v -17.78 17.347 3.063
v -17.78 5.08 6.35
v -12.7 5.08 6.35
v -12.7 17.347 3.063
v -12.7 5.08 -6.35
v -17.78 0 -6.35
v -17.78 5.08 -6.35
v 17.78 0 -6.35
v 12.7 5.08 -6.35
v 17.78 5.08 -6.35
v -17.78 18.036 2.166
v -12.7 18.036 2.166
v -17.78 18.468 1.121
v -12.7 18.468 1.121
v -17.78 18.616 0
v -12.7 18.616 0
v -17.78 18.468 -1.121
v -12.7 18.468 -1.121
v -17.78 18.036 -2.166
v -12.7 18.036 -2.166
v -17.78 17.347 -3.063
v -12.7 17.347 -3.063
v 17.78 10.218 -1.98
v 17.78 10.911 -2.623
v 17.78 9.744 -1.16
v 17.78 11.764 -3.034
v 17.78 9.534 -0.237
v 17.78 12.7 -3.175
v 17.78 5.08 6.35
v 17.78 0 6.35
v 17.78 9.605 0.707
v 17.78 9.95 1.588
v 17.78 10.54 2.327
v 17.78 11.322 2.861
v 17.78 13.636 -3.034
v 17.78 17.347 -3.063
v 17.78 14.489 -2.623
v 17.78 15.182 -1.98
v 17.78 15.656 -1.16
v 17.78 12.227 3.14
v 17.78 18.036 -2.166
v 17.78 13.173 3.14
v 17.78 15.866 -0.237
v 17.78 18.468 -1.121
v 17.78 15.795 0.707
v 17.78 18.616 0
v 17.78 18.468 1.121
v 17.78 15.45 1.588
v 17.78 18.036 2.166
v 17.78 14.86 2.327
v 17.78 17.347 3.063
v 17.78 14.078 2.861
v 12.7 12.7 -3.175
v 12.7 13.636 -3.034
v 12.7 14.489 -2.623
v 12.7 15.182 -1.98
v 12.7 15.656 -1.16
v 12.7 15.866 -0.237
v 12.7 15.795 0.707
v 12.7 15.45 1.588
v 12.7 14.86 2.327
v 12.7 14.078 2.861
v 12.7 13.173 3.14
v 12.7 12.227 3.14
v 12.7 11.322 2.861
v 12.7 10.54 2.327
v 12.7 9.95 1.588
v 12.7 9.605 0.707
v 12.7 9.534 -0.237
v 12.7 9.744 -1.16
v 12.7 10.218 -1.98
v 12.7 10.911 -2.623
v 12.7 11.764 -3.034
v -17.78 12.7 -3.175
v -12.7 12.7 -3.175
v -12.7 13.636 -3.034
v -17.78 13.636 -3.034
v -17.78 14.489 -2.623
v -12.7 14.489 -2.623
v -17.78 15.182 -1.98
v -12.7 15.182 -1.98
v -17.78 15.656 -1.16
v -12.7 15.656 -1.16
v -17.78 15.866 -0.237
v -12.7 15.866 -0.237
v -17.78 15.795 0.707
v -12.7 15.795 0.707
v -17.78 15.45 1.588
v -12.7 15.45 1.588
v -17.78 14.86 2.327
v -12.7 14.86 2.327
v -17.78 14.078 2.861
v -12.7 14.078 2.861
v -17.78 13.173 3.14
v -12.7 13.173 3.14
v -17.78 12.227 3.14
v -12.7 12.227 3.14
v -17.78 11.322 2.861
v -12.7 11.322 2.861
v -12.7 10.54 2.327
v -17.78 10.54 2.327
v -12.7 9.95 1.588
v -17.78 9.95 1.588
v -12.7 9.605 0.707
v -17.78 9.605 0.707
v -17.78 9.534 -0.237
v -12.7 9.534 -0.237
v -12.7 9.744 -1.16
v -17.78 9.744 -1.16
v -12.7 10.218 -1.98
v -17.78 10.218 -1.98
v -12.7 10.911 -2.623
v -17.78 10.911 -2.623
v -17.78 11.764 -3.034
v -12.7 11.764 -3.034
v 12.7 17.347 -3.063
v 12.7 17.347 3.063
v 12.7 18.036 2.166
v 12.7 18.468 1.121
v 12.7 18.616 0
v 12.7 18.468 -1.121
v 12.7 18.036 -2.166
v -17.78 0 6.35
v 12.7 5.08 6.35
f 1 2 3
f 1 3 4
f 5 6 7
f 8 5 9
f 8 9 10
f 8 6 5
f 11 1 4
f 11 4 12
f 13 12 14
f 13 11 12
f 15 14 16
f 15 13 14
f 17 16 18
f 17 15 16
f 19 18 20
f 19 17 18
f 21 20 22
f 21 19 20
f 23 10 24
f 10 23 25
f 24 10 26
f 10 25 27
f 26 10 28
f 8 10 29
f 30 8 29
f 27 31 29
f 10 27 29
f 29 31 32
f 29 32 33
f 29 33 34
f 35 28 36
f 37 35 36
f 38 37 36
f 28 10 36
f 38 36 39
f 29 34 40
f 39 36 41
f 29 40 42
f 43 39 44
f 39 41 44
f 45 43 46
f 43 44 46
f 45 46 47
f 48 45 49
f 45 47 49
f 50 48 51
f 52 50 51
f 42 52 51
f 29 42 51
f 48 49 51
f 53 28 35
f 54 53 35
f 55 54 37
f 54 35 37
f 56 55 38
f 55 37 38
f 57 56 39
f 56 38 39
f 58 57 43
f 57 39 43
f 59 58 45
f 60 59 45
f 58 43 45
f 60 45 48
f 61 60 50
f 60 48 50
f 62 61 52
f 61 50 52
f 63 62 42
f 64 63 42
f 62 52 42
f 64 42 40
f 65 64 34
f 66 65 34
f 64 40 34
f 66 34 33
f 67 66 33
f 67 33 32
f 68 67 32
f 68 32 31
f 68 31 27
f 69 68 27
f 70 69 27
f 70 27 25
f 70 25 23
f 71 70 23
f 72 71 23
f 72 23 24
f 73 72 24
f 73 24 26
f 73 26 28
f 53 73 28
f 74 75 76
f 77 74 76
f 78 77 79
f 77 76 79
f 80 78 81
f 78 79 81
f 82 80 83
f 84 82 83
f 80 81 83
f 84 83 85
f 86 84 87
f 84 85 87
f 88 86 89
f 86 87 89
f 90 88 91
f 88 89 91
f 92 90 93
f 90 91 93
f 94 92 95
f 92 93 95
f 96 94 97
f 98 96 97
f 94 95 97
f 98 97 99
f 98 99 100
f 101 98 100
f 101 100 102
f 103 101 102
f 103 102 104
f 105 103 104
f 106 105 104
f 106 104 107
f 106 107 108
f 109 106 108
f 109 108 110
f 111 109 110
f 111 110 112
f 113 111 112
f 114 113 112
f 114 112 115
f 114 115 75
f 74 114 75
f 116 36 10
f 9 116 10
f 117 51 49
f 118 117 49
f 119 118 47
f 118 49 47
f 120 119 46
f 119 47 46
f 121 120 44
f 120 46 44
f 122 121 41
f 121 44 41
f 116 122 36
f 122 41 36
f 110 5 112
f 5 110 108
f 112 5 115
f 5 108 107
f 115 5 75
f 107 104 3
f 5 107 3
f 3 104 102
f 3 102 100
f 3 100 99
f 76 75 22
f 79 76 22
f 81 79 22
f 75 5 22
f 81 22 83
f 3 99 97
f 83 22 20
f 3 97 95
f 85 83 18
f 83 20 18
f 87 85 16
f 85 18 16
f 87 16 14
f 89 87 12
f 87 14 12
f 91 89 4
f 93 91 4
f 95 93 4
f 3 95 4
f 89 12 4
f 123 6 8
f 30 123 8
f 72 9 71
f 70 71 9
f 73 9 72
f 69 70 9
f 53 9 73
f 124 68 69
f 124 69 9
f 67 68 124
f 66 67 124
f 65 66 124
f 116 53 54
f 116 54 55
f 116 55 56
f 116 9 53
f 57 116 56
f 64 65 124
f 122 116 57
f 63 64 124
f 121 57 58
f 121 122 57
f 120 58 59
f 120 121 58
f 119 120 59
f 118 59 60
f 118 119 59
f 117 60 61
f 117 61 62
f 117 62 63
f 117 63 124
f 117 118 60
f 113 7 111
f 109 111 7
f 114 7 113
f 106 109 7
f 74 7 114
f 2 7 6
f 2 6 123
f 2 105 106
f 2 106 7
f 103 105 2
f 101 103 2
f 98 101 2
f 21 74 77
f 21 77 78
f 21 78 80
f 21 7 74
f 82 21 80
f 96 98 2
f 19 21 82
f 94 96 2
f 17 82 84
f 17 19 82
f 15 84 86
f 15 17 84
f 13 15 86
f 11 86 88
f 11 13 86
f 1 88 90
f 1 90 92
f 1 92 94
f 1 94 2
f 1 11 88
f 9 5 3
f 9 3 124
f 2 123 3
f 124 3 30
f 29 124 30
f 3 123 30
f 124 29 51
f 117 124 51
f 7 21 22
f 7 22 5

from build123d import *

# Parameters (mm, degrees)
SKETCH1_W           = 35.56
SKETCH1_H           = 12.7
BOSS_EXTRUDE1_DEPTH = 5.08
BOSS_EXTRUDE2_DEPTH = 5.08
SKETCH3_R           = 3.175
CUT_EXTRUDE1_DEPTH  = 36.56


with BuildPart() as part:
    # Sketch1 → Boss-Extrude1 (new body)
    with BuildSketch(Plane(origin=(0, 0, 0), x_dir=(1, 0, 0), z_dir=(0, 1, 0))):
        Rectangle(SKETCH1_W, SKETCH1_H)
    extrude(amount=BOSS_EXTRUDE1_DEPTH)

    # Sketch2 → Boss-Extrude2 (add)
    with BuildSketch(Plane(origin=(17.78, 0, 0), x_dir=(0, 0, -1), z_dir=(1, 0, 0))):
        with BuildLine():
            Line((-6.35, 5.08), (-3.062998127, 17.347257994))
            ThreePointArc((-3.062998127, 17.347257994), (0, 18.61599336), (3.062998127, 17.347257994))
            Line((3.062998127, 17.347257994), (6.35, 5.08))
            Line((6.35, 5.08), (-6.35, 5.08))
        make_face()
    boss_extrude2 = extrude(amount=-BOSS_EXTRUDE2_DEPTH)

    # Mirror1: Boss-Extrude2 across plane
    add(boss_extrude2.mirror(Plane(origin=(0, 0, 0), x_dir=(0, 0, 1), z_dir=(1, 0, 0))))

    # Sketch3 → Cut-Extrude1 (cut, through all)
    with BuildSketch(Plane(origin=(17.78, 0, 0), x_dir=(0, 0, -1), z_dir=(1, 0, 0))):
        with Locations((0, 12.7)):
            Circle(SKETCH3_R)
    extrude(amount=-CUT_EXTRUDE1_DEPTH, mode=Mode.SUBTRACT)


solid = part.part
